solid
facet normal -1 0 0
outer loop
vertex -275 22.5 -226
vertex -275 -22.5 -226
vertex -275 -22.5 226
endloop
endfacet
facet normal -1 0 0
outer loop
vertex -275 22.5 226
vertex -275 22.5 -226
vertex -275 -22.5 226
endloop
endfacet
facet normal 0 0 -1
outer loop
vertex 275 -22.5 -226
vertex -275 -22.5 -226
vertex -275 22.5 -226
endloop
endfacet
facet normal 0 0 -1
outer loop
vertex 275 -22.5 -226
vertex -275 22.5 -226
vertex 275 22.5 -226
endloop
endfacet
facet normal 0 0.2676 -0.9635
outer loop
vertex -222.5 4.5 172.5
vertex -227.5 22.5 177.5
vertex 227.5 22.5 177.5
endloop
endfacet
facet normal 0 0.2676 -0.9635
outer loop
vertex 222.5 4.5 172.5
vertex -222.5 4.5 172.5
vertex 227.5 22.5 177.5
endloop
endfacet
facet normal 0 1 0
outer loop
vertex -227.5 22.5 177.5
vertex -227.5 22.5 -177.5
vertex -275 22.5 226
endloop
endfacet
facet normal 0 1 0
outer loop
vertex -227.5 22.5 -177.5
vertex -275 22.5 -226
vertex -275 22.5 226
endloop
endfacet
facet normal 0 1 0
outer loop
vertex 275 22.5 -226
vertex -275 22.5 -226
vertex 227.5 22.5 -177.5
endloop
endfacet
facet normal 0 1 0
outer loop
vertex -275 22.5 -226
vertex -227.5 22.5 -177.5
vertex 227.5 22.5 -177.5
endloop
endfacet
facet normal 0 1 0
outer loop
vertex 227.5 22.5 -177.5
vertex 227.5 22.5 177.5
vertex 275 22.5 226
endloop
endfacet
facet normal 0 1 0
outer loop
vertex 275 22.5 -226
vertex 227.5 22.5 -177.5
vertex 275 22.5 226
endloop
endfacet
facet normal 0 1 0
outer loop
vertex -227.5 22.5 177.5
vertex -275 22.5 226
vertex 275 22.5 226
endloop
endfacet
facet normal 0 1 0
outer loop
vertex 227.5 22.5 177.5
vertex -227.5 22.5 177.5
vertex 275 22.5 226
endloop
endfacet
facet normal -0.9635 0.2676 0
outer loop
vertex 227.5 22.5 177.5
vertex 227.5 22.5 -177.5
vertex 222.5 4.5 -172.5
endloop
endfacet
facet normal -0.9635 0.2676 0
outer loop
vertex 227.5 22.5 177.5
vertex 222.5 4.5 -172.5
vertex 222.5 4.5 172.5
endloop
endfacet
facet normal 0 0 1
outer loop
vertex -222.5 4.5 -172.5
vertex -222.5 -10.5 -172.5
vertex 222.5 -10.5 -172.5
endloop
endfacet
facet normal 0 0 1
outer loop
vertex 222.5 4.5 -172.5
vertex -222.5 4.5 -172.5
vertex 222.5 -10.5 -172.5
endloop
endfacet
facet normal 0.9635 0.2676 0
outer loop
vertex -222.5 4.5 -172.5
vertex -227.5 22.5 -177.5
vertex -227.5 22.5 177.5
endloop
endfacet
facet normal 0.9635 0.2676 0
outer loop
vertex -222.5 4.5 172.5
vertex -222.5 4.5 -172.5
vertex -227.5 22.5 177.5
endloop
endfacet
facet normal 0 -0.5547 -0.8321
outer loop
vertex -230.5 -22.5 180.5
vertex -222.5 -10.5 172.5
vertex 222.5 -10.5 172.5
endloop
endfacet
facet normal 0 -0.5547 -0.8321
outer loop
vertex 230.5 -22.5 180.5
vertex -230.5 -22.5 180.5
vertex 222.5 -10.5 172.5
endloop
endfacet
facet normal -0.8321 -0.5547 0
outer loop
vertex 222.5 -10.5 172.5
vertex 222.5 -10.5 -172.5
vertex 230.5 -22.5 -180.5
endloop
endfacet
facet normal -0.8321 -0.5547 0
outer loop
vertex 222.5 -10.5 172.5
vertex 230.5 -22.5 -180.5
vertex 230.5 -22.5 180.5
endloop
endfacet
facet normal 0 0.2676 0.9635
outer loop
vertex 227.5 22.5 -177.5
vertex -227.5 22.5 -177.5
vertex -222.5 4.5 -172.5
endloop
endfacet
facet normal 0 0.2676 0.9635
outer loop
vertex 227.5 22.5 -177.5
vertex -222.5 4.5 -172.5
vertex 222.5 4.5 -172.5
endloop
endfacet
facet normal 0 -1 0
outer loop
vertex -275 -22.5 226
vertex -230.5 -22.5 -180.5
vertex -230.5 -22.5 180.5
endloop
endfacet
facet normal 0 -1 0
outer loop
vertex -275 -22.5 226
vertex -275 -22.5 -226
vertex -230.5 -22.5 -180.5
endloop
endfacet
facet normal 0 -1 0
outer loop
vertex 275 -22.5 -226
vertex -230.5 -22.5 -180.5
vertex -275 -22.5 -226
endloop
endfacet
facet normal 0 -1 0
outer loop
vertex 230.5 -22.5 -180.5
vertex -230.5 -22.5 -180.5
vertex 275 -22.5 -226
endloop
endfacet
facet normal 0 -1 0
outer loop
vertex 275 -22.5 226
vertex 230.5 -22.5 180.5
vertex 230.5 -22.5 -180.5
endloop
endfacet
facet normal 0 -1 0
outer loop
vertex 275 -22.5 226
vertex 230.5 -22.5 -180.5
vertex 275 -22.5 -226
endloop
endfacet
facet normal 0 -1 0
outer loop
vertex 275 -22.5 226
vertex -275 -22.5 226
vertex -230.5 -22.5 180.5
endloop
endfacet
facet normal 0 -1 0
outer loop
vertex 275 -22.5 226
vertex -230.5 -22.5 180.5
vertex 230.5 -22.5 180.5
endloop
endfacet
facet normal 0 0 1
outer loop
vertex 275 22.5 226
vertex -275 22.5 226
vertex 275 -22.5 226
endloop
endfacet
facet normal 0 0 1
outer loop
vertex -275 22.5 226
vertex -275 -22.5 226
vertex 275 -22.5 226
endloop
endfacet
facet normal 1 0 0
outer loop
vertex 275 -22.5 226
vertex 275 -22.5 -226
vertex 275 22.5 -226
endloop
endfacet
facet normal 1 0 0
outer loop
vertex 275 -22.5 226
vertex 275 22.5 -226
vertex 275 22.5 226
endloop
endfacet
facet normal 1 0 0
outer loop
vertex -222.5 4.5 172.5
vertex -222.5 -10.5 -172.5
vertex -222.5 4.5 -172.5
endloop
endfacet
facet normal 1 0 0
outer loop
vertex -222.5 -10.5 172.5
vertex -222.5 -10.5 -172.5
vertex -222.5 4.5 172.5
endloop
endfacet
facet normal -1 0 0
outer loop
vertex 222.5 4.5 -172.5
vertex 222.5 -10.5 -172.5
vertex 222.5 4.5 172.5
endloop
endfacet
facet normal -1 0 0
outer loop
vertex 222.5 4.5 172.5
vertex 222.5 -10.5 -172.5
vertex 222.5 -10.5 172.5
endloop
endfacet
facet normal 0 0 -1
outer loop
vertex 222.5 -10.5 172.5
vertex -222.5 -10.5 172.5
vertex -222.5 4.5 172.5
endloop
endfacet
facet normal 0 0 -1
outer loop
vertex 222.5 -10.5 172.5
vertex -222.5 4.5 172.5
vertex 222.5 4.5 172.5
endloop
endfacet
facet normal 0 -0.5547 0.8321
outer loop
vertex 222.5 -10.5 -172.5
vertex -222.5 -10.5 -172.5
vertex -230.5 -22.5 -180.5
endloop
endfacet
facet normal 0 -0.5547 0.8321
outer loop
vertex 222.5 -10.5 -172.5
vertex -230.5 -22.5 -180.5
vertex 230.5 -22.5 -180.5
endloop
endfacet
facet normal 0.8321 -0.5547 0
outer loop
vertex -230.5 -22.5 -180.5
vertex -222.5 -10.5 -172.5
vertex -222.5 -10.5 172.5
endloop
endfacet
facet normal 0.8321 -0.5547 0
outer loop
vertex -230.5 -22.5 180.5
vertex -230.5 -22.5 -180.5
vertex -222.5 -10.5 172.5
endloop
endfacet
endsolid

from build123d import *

# Parameters (mm, degrees)
F0_W     = 550
F0_H     = 452
F0_W_2   = 445
F0_H_2   = 345
F1_DEPTH = 22.5
F2_SIZE2 = 5
F2_SIZE  = 18
F3_SIZE2 = 12
F3_SIZE  = 8


with BuildPart() as f1:
    # F0 (on Front) → F1 (new body, symmetric)
    with BuildSketch(Plane.XZ):
        Rectangle(F0_W, F0_H)
        Rectangle(F0_W_2, F0_H_2, mode=Mode.SUBTRACT)
    extrude(amount=F1_DEPTH, both=True)

    # F2
    f2_edges = [f1.edges().sort_by_distance(p)[0] for p in [
        (0, 22.5, -172.5),
        (222.5, 22.5, 0),
        (-222.5, 22.5, 0),
        (0, 22.5, 172.5),
    ]]
    chamfer(f2_edges, length=F2_SIZE, length2=F2_SIZE2)

    # F3
    f3_edges = [f1.edges().sort_by_distance(p)[0] for p in [
        (0, -22.5, -172.5),
        (-222.5, -22.5, 0),
        (222.5, -22.5, 0),
        (0, -22.5, 172.5),
    ]]
    f3_side = f1.faces().sort_by_distance((0, -22.5, 218.880983))[0]
    chamfer(f3_edges, length=F3_SIZE, length2=F3_SIZE2, reference=f3_side)


solid = f1.part
